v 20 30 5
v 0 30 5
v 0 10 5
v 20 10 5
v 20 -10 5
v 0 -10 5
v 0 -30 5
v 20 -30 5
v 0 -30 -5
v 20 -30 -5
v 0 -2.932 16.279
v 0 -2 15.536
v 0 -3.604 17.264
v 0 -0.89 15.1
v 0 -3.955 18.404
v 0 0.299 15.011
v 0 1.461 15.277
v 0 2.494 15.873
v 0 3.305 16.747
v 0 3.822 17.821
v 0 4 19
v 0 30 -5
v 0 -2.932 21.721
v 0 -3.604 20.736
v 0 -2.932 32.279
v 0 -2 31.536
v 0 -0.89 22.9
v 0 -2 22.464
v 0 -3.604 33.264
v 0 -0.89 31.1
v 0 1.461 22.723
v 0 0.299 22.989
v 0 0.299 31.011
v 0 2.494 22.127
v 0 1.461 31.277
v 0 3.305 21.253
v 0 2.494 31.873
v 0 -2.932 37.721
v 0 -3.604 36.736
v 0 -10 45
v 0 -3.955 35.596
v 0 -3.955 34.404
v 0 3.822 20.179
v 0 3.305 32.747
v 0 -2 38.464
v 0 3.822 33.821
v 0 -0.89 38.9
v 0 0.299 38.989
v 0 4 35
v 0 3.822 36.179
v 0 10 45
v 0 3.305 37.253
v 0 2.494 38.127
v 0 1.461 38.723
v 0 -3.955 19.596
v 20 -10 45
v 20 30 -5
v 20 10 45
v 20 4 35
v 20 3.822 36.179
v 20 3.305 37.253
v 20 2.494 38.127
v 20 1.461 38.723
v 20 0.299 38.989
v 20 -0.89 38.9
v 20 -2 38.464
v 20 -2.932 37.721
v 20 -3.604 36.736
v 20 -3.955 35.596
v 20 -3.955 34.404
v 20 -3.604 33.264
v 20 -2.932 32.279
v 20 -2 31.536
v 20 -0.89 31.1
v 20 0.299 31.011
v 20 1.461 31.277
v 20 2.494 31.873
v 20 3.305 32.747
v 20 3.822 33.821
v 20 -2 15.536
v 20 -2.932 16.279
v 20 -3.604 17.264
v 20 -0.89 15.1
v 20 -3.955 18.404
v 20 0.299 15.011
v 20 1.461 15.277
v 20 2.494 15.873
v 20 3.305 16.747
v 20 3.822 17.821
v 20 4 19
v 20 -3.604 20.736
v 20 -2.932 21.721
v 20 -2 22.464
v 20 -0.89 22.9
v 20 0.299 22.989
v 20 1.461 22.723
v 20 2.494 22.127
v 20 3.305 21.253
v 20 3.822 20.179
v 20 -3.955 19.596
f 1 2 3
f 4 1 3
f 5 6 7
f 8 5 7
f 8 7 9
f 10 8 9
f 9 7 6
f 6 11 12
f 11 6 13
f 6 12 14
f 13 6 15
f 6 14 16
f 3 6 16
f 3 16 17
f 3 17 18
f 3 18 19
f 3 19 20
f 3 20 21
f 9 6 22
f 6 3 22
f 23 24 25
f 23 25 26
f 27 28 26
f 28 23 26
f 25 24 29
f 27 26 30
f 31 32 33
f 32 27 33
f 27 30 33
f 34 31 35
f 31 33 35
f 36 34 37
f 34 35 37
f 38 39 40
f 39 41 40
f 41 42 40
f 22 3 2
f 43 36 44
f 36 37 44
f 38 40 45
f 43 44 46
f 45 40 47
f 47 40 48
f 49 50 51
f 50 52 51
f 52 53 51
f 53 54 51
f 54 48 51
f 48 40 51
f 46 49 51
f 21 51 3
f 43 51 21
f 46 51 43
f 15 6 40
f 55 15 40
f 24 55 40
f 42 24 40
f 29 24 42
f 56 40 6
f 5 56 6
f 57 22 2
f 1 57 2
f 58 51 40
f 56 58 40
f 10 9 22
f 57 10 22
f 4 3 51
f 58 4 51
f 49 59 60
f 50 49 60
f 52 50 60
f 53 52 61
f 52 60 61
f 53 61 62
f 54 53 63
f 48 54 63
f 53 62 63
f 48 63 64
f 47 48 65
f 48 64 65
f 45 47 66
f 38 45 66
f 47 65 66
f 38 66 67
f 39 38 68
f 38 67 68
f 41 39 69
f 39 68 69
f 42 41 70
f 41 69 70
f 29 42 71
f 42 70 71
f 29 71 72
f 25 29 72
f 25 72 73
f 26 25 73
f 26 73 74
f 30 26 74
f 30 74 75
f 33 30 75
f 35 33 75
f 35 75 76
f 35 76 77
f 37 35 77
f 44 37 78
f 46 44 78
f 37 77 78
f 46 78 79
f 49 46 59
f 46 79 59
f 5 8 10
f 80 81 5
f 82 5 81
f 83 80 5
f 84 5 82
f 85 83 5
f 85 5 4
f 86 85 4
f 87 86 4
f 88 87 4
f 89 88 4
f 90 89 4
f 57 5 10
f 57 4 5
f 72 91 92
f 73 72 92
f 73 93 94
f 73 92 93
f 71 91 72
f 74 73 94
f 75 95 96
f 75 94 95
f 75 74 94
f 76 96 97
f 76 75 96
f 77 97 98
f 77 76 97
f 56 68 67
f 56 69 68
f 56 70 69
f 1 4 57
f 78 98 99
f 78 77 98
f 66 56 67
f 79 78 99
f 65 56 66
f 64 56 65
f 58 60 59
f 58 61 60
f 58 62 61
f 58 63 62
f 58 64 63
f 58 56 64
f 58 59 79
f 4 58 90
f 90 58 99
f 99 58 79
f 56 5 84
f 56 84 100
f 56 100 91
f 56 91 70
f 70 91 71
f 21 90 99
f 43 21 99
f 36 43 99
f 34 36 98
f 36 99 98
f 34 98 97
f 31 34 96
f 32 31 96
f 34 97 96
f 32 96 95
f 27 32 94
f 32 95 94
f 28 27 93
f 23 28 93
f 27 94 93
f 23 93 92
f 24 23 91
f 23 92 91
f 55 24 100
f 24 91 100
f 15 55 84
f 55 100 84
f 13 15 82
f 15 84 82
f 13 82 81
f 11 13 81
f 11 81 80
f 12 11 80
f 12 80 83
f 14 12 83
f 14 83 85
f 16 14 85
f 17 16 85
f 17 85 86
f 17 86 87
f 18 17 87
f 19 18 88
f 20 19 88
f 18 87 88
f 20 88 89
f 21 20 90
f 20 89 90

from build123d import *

# Parameters (mm, degrees)
PAD_DEPTH    = 20
SKETCH001_R  = 4
POCKET_DEPTH = 20


with BuildPart() as part:
    # Sketch → Pad (new body)
    with BuildSketch(Plane.YZ):
        Polygon((-30, -5), (30, -5), (30, 5), (10, 5), (10, 45), (-10, 45), (-10, 5), (-30, 5), align=None)
    extrude(amount=PAD_DEPTH)

    # Sketch001 → Pocket (cut)
    with BuildSketch(Plane.YZ.offset(20)):
        with Locations((0, 35)):
            Circle(SKETCH001_R)
        with Locations((0, 19)):
            Circle(SKETCH001_R)
    extrude(amount=-POCKET_DEPTH, mode=Mode.SUBTRACT)


solid = part.part
